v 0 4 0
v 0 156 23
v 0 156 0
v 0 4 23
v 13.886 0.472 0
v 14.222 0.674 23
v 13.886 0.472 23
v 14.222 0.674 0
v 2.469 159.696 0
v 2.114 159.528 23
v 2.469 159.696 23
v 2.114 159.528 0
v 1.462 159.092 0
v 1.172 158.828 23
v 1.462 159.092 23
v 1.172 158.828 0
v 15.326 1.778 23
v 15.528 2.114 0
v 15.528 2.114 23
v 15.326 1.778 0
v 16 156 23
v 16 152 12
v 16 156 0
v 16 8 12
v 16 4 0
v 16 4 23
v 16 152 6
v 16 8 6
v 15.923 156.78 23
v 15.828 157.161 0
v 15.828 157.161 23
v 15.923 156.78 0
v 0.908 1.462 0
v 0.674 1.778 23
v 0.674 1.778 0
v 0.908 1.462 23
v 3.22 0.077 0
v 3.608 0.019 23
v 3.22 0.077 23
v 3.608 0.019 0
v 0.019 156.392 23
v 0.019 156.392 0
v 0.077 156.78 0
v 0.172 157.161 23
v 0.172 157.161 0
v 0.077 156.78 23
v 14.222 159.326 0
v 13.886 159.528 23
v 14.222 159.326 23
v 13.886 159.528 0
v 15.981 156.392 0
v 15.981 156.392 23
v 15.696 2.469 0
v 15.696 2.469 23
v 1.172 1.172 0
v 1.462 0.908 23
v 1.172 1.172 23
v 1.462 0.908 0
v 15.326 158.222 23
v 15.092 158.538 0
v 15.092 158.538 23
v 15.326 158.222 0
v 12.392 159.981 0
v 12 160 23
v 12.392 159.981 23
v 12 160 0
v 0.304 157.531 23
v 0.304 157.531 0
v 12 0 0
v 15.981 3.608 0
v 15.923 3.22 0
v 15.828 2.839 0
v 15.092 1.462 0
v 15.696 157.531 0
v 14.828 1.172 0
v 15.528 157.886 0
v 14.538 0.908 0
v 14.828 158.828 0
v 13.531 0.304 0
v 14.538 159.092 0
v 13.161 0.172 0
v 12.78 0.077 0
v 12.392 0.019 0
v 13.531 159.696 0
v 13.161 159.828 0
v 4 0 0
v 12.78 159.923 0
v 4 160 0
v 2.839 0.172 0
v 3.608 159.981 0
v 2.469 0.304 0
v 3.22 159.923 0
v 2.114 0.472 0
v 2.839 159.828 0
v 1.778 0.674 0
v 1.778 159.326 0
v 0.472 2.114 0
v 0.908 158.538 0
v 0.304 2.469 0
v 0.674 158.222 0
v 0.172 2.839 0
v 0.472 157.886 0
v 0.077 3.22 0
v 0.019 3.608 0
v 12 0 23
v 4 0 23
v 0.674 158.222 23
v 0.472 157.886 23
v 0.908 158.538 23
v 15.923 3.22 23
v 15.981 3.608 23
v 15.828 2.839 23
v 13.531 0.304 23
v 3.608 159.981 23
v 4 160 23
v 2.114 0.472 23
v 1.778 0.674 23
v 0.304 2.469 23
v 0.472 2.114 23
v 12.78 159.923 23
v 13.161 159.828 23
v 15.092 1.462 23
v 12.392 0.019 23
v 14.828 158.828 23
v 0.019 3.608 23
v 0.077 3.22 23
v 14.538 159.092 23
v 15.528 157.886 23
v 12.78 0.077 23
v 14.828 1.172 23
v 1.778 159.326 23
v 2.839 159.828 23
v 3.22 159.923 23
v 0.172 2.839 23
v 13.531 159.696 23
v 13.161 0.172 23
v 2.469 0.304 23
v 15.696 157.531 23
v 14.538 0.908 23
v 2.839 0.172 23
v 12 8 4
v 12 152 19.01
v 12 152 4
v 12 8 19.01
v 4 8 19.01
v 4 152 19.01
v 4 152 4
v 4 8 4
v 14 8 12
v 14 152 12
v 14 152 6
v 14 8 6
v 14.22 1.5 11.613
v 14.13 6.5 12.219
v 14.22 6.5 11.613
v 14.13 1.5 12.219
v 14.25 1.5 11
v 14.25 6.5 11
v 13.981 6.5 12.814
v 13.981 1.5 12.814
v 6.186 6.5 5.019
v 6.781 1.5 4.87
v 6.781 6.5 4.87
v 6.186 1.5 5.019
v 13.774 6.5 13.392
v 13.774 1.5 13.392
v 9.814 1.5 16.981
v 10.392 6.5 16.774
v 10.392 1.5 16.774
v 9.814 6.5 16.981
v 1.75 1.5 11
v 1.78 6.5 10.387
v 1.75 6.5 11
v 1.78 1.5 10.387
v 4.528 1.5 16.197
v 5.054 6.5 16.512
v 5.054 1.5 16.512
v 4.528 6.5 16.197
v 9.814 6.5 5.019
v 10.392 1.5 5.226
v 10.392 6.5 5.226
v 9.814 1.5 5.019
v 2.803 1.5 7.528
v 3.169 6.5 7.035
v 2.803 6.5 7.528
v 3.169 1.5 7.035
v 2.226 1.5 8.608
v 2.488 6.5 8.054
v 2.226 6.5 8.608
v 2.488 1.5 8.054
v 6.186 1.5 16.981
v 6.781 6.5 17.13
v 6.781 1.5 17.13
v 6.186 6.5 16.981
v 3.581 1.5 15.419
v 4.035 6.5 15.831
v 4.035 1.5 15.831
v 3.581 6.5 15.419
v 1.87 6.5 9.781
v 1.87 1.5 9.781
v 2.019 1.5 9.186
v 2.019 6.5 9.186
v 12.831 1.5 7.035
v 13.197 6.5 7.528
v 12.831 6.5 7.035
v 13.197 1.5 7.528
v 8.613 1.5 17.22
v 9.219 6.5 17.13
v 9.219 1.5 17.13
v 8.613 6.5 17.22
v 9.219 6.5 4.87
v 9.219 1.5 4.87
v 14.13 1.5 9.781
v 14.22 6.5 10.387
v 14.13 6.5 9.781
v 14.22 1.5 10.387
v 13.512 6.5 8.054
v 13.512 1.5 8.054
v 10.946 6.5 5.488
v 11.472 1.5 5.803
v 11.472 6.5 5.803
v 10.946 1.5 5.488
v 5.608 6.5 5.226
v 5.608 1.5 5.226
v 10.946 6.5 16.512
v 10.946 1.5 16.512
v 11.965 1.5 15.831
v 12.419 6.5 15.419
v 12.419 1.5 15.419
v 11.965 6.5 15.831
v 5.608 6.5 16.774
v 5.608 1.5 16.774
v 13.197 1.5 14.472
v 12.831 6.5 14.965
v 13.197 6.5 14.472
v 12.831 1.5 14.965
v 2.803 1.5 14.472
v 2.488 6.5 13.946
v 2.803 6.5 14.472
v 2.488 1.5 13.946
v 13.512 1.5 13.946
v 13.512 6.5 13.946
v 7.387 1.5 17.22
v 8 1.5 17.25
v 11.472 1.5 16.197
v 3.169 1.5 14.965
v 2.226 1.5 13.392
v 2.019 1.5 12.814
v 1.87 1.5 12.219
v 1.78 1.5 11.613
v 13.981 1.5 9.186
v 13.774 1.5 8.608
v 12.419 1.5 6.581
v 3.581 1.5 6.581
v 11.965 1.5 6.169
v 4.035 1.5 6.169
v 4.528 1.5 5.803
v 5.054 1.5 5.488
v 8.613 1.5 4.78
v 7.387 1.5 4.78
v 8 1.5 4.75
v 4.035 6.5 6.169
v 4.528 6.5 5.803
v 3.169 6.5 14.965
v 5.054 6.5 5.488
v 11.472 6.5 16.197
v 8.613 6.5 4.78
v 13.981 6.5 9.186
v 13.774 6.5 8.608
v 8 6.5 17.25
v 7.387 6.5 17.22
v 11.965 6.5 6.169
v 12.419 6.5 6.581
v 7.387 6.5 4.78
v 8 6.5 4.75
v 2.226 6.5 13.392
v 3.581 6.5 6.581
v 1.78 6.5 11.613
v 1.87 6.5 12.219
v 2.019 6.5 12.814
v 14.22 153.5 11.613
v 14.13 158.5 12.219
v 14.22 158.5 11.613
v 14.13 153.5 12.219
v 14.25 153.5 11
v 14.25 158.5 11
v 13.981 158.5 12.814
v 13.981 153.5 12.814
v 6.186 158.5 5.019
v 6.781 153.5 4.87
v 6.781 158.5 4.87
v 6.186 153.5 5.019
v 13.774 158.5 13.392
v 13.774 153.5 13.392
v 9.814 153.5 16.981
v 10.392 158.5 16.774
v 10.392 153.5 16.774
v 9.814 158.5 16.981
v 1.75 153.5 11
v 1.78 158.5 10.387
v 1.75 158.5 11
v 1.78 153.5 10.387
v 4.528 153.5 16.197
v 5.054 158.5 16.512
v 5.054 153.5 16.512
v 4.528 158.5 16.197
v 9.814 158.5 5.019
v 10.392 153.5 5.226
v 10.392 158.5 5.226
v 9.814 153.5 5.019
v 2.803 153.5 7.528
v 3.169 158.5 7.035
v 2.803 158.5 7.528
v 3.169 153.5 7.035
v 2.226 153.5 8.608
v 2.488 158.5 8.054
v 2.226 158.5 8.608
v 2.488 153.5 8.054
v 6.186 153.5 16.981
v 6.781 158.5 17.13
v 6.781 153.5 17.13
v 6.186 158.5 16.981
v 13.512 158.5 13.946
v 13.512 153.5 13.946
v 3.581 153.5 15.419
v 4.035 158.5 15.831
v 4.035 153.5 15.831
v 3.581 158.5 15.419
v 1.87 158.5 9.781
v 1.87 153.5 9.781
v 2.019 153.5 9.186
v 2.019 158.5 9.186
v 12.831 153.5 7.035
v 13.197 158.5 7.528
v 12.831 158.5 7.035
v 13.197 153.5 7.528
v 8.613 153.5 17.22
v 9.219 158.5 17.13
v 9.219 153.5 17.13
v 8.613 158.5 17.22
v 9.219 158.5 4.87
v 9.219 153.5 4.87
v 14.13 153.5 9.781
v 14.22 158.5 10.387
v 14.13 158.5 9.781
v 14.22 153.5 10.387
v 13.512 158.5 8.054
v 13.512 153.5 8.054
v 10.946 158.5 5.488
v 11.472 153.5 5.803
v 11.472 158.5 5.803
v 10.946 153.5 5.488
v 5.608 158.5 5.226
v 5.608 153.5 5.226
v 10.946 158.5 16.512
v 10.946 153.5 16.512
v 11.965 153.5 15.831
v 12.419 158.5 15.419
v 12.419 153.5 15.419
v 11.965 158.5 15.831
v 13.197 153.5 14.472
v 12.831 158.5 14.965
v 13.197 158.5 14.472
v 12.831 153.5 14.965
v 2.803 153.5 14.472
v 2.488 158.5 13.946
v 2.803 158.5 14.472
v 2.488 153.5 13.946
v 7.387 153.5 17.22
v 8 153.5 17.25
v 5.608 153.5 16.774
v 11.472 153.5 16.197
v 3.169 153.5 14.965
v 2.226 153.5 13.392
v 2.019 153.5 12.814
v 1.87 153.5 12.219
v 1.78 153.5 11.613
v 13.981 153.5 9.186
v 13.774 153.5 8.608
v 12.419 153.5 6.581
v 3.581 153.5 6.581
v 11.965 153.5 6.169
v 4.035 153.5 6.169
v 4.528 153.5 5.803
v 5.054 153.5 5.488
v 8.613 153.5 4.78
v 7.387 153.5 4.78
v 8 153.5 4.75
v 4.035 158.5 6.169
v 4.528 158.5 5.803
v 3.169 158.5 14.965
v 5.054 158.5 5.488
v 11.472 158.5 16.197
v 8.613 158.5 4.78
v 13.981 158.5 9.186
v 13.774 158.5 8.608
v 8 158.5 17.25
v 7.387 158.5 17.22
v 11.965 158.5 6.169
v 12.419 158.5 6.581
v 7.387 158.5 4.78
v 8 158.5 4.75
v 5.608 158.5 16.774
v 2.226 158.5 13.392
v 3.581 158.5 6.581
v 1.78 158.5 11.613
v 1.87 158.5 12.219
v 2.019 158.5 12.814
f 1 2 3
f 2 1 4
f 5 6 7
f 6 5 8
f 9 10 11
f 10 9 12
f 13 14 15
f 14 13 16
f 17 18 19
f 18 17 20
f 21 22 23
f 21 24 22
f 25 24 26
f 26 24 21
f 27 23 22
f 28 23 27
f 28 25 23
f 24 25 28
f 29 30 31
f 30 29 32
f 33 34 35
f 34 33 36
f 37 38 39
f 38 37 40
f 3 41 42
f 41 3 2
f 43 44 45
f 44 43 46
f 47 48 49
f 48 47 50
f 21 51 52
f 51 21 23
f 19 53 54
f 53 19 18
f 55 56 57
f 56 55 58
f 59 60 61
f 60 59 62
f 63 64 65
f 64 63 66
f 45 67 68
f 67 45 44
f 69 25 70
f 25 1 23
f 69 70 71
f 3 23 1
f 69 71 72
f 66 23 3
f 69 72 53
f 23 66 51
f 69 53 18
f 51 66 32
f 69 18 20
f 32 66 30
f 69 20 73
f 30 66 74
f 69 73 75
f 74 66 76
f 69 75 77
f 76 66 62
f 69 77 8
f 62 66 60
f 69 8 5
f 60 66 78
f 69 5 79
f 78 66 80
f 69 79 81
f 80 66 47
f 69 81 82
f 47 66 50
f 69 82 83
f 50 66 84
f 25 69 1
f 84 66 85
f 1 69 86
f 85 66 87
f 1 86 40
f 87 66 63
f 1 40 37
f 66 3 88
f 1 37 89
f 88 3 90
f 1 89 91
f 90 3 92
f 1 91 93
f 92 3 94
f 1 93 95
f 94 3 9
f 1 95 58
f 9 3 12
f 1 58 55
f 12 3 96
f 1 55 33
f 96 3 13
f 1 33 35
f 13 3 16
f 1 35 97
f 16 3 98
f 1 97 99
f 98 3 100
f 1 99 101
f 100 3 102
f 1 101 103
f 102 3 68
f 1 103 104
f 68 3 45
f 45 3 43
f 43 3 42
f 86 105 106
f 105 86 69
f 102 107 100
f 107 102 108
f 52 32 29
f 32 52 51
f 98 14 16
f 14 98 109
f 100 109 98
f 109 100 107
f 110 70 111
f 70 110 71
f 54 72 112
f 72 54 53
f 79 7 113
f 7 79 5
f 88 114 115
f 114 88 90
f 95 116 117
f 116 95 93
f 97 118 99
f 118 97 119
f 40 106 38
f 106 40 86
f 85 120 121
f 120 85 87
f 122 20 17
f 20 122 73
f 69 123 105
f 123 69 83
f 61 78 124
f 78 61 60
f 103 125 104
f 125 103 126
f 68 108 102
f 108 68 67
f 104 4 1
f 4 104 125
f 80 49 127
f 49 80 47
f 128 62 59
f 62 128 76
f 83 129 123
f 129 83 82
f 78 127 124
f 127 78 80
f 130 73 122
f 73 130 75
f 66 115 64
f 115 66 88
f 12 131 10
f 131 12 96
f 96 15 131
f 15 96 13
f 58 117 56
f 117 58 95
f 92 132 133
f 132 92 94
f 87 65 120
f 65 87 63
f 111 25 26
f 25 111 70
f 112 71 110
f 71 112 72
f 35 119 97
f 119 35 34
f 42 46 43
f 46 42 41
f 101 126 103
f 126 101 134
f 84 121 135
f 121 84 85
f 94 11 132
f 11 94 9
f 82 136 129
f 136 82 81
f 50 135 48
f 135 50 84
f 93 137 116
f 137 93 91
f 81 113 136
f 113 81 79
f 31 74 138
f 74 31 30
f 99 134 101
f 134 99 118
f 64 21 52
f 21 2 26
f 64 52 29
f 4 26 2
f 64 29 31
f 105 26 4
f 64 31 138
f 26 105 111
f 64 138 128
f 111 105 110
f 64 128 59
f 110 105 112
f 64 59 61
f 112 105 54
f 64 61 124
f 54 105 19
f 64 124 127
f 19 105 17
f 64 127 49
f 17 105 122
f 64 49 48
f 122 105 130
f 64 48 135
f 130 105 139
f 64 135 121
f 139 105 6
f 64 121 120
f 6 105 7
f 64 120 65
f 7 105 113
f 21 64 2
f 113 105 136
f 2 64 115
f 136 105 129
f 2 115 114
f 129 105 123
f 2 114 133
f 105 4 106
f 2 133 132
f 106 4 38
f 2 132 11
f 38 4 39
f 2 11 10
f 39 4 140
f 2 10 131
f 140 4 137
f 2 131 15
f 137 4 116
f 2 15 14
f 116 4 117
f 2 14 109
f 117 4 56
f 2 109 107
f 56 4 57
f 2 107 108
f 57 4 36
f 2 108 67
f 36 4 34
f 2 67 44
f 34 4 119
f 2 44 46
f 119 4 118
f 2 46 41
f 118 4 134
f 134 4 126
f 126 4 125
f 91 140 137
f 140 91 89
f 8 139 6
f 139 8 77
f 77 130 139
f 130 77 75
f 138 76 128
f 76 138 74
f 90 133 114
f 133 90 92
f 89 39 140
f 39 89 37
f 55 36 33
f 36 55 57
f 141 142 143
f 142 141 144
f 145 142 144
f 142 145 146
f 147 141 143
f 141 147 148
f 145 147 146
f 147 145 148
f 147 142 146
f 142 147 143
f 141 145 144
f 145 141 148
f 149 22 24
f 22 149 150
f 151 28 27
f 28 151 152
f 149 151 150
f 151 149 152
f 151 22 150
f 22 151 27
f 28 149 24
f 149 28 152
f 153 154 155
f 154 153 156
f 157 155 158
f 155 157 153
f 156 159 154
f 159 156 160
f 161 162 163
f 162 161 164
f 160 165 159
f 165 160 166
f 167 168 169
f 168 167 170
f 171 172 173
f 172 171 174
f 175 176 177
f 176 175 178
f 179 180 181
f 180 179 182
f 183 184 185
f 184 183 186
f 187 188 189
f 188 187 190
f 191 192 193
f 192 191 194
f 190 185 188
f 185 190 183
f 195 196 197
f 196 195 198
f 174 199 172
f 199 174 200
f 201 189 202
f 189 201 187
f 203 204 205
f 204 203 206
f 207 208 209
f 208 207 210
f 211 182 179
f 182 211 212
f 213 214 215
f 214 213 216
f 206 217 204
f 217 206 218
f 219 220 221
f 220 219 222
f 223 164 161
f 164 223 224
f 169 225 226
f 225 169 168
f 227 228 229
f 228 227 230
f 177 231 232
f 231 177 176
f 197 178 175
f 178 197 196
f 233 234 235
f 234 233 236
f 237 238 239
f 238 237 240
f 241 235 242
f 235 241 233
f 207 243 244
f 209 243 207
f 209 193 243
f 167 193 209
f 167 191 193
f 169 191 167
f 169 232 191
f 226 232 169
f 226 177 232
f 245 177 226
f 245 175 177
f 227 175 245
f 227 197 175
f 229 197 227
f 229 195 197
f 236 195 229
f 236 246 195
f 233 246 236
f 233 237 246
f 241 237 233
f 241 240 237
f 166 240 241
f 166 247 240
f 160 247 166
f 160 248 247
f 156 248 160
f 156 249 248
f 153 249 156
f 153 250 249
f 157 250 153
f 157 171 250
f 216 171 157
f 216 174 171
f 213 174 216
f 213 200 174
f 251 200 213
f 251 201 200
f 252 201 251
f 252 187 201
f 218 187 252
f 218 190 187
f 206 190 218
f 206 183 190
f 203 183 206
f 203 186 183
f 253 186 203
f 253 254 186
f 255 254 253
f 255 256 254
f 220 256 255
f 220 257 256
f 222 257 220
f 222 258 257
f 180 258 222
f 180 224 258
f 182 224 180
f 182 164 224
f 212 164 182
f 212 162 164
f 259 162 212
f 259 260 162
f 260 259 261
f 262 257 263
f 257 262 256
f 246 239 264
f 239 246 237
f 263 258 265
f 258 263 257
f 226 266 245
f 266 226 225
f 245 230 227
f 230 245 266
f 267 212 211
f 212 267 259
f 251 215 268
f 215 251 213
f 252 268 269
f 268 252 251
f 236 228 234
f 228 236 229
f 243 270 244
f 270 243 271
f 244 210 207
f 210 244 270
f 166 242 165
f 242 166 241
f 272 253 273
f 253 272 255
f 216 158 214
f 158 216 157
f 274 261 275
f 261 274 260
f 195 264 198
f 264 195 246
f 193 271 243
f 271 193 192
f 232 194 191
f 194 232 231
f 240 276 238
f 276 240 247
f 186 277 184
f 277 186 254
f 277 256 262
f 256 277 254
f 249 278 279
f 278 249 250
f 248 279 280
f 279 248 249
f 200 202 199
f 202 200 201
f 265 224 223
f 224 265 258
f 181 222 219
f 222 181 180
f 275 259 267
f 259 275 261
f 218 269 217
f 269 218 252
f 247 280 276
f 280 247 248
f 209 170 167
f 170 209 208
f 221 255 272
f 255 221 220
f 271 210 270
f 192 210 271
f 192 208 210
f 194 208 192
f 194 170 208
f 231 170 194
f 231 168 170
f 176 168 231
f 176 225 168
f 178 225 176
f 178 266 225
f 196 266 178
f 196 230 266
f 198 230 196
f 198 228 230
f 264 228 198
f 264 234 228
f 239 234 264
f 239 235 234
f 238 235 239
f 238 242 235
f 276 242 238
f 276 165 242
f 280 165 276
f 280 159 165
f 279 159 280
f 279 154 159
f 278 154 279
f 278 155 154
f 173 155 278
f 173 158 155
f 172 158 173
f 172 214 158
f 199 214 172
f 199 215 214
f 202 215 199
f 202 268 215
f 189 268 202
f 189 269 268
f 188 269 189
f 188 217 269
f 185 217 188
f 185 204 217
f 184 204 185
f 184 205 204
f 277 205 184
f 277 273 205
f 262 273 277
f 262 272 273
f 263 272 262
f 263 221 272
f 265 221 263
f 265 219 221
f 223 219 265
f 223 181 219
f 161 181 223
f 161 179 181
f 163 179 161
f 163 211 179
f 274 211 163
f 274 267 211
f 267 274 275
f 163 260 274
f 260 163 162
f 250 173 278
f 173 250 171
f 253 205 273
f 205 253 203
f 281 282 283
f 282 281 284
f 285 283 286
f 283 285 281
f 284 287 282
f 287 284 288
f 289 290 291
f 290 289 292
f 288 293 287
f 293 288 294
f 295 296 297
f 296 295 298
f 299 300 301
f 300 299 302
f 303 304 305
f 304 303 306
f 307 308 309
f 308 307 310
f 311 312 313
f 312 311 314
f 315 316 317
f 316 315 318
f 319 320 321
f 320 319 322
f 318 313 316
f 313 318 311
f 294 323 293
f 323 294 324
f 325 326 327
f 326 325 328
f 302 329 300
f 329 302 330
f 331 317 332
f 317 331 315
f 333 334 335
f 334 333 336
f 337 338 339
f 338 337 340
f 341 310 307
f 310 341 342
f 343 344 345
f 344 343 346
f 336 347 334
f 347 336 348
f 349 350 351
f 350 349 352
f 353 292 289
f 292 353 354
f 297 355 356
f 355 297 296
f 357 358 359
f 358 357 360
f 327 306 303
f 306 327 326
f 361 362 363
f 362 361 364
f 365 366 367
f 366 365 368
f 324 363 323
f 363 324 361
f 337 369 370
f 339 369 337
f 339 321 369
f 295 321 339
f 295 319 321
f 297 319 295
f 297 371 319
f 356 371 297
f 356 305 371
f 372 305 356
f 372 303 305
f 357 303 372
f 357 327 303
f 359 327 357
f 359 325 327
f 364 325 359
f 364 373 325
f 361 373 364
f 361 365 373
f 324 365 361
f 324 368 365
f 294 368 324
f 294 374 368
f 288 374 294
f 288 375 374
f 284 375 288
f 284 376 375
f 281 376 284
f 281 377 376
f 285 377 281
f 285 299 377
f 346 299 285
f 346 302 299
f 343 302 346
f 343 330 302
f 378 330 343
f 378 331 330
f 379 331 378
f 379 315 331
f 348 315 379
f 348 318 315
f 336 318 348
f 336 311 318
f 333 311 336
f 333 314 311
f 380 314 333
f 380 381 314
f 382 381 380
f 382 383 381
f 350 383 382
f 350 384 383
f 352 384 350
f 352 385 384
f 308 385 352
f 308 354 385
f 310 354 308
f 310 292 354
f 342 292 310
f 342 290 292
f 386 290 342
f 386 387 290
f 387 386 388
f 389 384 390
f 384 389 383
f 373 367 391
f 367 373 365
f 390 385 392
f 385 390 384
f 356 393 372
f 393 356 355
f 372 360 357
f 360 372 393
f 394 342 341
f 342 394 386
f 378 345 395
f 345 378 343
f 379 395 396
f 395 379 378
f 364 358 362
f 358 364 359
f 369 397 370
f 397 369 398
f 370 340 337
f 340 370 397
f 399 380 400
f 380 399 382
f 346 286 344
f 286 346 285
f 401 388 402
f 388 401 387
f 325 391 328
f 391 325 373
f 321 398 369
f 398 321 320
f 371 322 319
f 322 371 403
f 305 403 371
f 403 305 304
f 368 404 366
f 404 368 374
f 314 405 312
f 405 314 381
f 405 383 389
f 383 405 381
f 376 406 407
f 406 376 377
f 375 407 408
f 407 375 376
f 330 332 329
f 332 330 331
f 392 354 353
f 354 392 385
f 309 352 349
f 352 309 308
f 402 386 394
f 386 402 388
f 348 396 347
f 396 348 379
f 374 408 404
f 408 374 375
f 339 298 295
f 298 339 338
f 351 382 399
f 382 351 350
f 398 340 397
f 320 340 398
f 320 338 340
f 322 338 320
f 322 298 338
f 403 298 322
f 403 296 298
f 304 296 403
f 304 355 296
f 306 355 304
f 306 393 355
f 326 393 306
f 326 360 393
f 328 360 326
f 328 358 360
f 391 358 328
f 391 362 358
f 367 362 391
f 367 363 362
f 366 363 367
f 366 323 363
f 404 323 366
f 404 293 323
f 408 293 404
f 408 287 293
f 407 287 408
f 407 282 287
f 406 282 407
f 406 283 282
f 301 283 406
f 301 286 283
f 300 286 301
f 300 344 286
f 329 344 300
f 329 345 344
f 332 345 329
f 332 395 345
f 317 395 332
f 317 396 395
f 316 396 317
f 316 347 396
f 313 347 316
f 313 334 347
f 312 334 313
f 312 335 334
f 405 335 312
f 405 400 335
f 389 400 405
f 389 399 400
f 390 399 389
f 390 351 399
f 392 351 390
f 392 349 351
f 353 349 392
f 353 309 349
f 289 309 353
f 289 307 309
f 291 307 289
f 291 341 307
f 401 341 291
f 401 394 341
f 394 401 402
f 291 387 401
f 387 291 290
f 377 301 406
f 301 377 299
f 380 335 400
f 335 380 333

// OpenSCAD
// file: chopperchair_params.scad
// ChopperChair — Shared Parameters
// Injected by pipeline/bridge.py from measurements.json
// License: CC-BY-SA 4.0

// ── Dog measurements (mm) ─────────────────────────────────────────────────
torso_length     = 160;  // shoulder to hip
hip_width        = 90;   // widest point across hips
shoulder_width   = 80;   // front saddle width
rear_leg_length  = 80;   // floor to hip joint
ground_clearance = 45;   // chassis floor height
girth            = 165;  // belly circumference (harness ref)

// ── Hardware (mm) ─────────────────────────────────────────────────────────
wheel_diameter   = 100;  // purchased wheel OD
axle_diameter    = 8;    // purchased axle rod OD (Build 2: 8mm steel)
hub_motor_od     = 80;   // T-Motor MN1005 stator OD (Build 4 only)
hub_motor_depth  = 28;   // motor depth (Build 4 only)

// ── Frame geometry (mm) ───────────────────────────────────────────────────
wall_thickness   = 4;
rail_w           = 16;
rail_h           = 20;
crossbar_od      = 12;
spring_boss_od   = 18;
stopper_w        = 22;
stopper_h        = 15;

// ── SitGo pivot ───────────────────────────────────────────────────────────
collapse_angle   = 45;   // degrees — full lie-down
sit_angle        = 25;   // degrees — sit position
pivot_arm_t      = wall_thickness * 2.5;  // arm thickness

// ── Tolerances ────────────────────────────────────────────────────────────
clear_close      = 0.15; // press-fit clearance
clear_slide      = 0.25; // sliding fit clearance
clear_free       = 0.4;  // free-running clearance

$fn = 64;
// main file
// ChopperChair — Build 4: APEX (Motorized)
// Hub motors replace torsion springs.
// ODrive Mini x2 on CAN bus. Pi5 SpinePod. NeoPixel wheel hubs.
// T-Motor MN1005 100KV (~80mm OD, ~28mm depth)
// License: CC-BY-SA 4.0

include <chopperchair_params.scad>;

// ── Utilities ─────────────────────────────────────────────────────────────
module rounded_rect(w, h, d, r=3) {
    hull() {
        translate([ r, r, 0]) cylinder(r=r, h=d);
        translate([w-r, r, 0]) cylinder(r=r, h=d);
        translate([ r, h-r, 0]) cylinder(r=r, h=d);
        translate([w-r, h-r, 0]) cylinder(r=r, h=d);
    }
}

// ── APEX Pivot Arm (motor pocket instead of spring boss) ──────────────────
// The T-Motor MN1005 mounts in a recessed pocket on the arm face.
// Motor stator is fixed; wheel/rotor spins around it.
module apex_pivot_arm() {
    arm_w   = rail_w * 1.1;  // slightly wider for motor pocket clearance
    axle_z  = wheel_diameter/2 + 5;
    t       = pivot_arm_t * 1.4;  // thicker — motor reaction loads
    tab_h   = rail_h;

    difference() {
        union() {
            // Main arm body
            rounded_rect(arm_w, rear_leg_length, t, r=4);
            // Motor mount boss — raised ring around pocket
            translate([arm_w/2, axle_z, t])
                difference() {
                    cylinder(d=hub_motor_od + 8, h=3);
                    cylinder(d=hub_motor_od - 4, h=4);
                }
            // ODrive Mini bracket tab (rear)
            translate([arm_w, rear_leg_length - tab_h, 0])
                rounded_rect(rail_w*1.5, tab_h, t * 0.7, r=3);
        }

        // Motor pocket — T-Motor MN1005 sits flush
        translate([arm_w/2, axle_z, t - hub_motor_depth + 0.01])
            cylinder(d=hub_motor_od + clear_free*2, h=hub_motor_depth + 1);

        // Motor shaft bore (8mm — same as axle)
        translate([arm_w/2, axle_z, -1])
            cylinder(d=axle_diameter + clear_slide*2, h=t + 2);

        // Motor mounting bolt pattern (4x M3, 58mm BCD — MN1005 standard)
        for (a=[0,90,180,270]) {
            rotate([0,0,a])
            translate([arm_w/2 + 29, axle_z, t - 6])
                cylinder(d=3.4, h=8);
        }

        // Pivot bore (top — connects to rail)
        translate([arm_w/2, rear_leg_length - tab_h/2, -1])
            cylinder(d=axle_diameter + clear_close*2, h=t + 2);

        // ODrive mounting holes on tab (M3 x2)
        translate([arm_w + rail_w*0.5, rear_leg_length - tab_h*0.35, -1])
            cylinder(d=3.4, h=t*0.7 + 2);
        translate([arm_w + rail_w*0.5, rear_leg_length - tab_h*0.65, -1])
            cylinder(d=3.4, h=t*0.7 + 2);

        // Lightening cutouts along arm
        translate([arm_w/2, rear_leg_length * 0.5, t * 0.3])
            cylinder(d=arm_w * 0.5, h=t * 0.5);
    }
}

// ── APEX Rail (cable routing channels added) ───────────────────────────────
module apex_rail() {
    difference() {
        rounded_rect(rail_w, torso_length, rail_h * 1.15, r=4);

        // Internal lightening pocket
        translate([wall_thickness, wall_thickness*2, wall_thickness])
            cube([rail_w - wall_thickness*2,
                  torso_length - wall_thickness*4,
                  rail_h*1.15 - wall_thickness*2 + 0.01]);

        // Cable routing channel (6mm wide, runs full length on inner face)
        translate([rail_w - 2, wall_thickness*2, wall_thickness + 2])
            cube([3, torso_length - wall_thickness*4, 6]);

        // Crossbar sockets
        translate([rail_w/2, wall_thickness, rail_h*0.55])
            rotate([90,0,0]) cylinder(d=crossbar_od + clear_slide*2, h=wall_thickness+1, center=true);
        translate([rail_w/2, torso_length - wall_thickness, rail_h*0.55])
            rotate([90,0,0]) cylinder(d=crossbar_od + clear_slide*2, h=wall_thickness+1, center=true);
    }
}

// ── SpinePod — Pi5 + electronics chassis (mounts to crossbar) ────────────
// Houses: Pi5, Pi Camera ribbon, NeoPixel driver, CAN transceiver, LiPo
module spinepod_base() {
    pod_l = 120;  // Pi5 length + margin
    pod_w = 70;
    pod_h = 28;
    wall  = 2.5;

    difference() {
        // Outer shell
        rounded_rect(pod_w, pod_l, pod_h, r=5);
        // Interior cavity
        translate([wall, wall, wall])
            rounded_rect(pod_w - wall*2, pod_l - wall*2, pod_h, r=3);
        // Pi5 mounting hole pattern (58mm x 49mm — Pi5 standard)
        for (x=[0,58], y=[0,49]) {
            translate([pod_w*0.5 - 29 + x, pod_l*0.5 - 24.5 + y, -1])
                cylinder(d=2.8, h=wall + 2);  // M2.5 tapping holes
        }
        // Camera ribbon slot (22mm wide, front face)
        translate([pod_w/2 - 11, -0.01, pod_h - 8])
            cube([22, wall + 1, 6]);
        // Crossbar mounting slot (fits over crossbar_od tube)
        translate([pod_w/2 - crossbar_od/2 - 1, pod_l*0.25, -1])
            cube([crossbar_od + 2, crossbar_od + 2, wall + 2]);
        translate([pod_w/2 - crossbar_od/2 - 1, pod_l*0.65, -1])
            cube([crossbar_od + 2, crossbar_od + 2, wall + 2]);
        // Ventilation slots
        for (i=[0,1,2]) {
            translate([wall*2 + i*8, pod_l*0.1, -0.01])
                cube([4, pod_l*0.6, wall + 0.01]);
        }
        // USB-C power port cutout (Pi5 power)
        translate([-0.01, pod_l*0.5 - 5, wall + 6])
            cube([wall + 1, 10, 8]);
    }
}

module spinepod_lid() {
    pod_l = 120;
    pod_w = 70;
    wall  = 2.5;
    difference() {
        rounded_rect(pod_w, pod_l, wall * 1.5, r=5);
        // Clip slots
        for (x=[0.15, 0.85], y=[0.1, 0.9]) {
            translate([pod_w*x - 2, pod_l*y - 2, -1])
                cube([4, 4, wall*1.5 + 2]);
        }
    }
}

// ── NeoPixel hub ring cover (mounts over motor face, diffuses LED ring) ───
module neopixel_hub_cover() {
    ring_d  = 44;  // 16-LED 44mm NeoPixel ring OD
    ring_id = 34;  // inner diameter
    depth   = 8;
    wall    = 1.8;
    difference() {
        cylinder(d=hub_motor_od - 4, h=depth);
        // Translucent diffuser cavity
        translate([0, 0, wall])
            cylinder(d=hub_motor_od - 4 - wall*2, h=depth);
        // NeoPixel ring shelf (ring snaps in at 4mm depth)
        translate([0, 0, wall + 2])
            difference() {
                cylinder(d=ring_d + clear_slide*2, h=depth);
                cylinder(d=ring_id - clear_slide*2, h=depth);
            }
        // Shaft bore
        cylinder(d=axle_diameter + clear_free*2, h=depth + 1);
        // Motor bolt pass-through
        for (a=[0,90,180,270]) {
            rotate([0,0,a]) translate([29, 0, -1])
                cylinder(d=3.6, h=depth + 2);
        }
    }
}

// ── Axle cap (same as Build 2) ────────────────────────────────────────────
module axle_cap() {
    difference() {
        cylinder(d=axle_diameter + 8, h=14);
        translate([0,0,-0.01]) cylinder(d=axle_diameter - clear_close*2, h=10);
        translate([axle_diameter/2 + 2, 0, 7]) rotate([0,90,0]) cylinder(d=3.3, h=8);
    }
}

module belly_sling_mount() {
    slot_w = 12; slot_h = 4;
    difference() {
        rounded_rect(hip_width * 0.4, 30, 8, r=3);
        translate([8, 10, wall_thickness]) cube([slot_w, slot_h, 8 - wall_thickness + 1]);
        translate([hip_width*0.4 - 8 - slot_w, 10, wall_thickness]) cube([slot_w, slot_h, 8 - wall_thickness + 1]);
        translate([hip_width*0.4/2, 25, -1]) cylinder(d=4.5, h=10);
    }
}

// ── Part selector ─────────────────────────────────────────────────────────
part = "rail_left";
// rail_left | rail_right | crossbar_front | crossbar_rear
// pivot_arm_left | pivot_arm_right | axle_cap_left | axle_cap_right
// belly_sling_mount | spinepod_base | spinepod_lid | neopixel_hub_cover

if (part == "rail_left")           apex_rail();
if (part == "rail_right")          mirror([1,0,0]) apex_rail();
if (part == "crossbar_front")      cylinder(d=crossbar_od, h=hip_width + rail_w*2);
if (part == "crossbar_rear")       cylinder(d=crossbar_od, h=hip_width + rail_w*2);
if (part == "pivot_arm_left")      apex_pivot_arm();
if (part == "pivot_arm_right")     mirror([1,0,0]) apex_pivot_arm();
if (part == "axle_cap_left")       axle_cap();
if (part == "axle_cap_right")      axle_cap();
if (part == "belly_sling_mount")   belly_sling_mount();
if (part == "spinepod_base")       spinepod_base();
if (part == "spinepod_lid")        spinepod_lid();
if (part == "neopixel_hub_cover")  neopixel_hub_cover();
